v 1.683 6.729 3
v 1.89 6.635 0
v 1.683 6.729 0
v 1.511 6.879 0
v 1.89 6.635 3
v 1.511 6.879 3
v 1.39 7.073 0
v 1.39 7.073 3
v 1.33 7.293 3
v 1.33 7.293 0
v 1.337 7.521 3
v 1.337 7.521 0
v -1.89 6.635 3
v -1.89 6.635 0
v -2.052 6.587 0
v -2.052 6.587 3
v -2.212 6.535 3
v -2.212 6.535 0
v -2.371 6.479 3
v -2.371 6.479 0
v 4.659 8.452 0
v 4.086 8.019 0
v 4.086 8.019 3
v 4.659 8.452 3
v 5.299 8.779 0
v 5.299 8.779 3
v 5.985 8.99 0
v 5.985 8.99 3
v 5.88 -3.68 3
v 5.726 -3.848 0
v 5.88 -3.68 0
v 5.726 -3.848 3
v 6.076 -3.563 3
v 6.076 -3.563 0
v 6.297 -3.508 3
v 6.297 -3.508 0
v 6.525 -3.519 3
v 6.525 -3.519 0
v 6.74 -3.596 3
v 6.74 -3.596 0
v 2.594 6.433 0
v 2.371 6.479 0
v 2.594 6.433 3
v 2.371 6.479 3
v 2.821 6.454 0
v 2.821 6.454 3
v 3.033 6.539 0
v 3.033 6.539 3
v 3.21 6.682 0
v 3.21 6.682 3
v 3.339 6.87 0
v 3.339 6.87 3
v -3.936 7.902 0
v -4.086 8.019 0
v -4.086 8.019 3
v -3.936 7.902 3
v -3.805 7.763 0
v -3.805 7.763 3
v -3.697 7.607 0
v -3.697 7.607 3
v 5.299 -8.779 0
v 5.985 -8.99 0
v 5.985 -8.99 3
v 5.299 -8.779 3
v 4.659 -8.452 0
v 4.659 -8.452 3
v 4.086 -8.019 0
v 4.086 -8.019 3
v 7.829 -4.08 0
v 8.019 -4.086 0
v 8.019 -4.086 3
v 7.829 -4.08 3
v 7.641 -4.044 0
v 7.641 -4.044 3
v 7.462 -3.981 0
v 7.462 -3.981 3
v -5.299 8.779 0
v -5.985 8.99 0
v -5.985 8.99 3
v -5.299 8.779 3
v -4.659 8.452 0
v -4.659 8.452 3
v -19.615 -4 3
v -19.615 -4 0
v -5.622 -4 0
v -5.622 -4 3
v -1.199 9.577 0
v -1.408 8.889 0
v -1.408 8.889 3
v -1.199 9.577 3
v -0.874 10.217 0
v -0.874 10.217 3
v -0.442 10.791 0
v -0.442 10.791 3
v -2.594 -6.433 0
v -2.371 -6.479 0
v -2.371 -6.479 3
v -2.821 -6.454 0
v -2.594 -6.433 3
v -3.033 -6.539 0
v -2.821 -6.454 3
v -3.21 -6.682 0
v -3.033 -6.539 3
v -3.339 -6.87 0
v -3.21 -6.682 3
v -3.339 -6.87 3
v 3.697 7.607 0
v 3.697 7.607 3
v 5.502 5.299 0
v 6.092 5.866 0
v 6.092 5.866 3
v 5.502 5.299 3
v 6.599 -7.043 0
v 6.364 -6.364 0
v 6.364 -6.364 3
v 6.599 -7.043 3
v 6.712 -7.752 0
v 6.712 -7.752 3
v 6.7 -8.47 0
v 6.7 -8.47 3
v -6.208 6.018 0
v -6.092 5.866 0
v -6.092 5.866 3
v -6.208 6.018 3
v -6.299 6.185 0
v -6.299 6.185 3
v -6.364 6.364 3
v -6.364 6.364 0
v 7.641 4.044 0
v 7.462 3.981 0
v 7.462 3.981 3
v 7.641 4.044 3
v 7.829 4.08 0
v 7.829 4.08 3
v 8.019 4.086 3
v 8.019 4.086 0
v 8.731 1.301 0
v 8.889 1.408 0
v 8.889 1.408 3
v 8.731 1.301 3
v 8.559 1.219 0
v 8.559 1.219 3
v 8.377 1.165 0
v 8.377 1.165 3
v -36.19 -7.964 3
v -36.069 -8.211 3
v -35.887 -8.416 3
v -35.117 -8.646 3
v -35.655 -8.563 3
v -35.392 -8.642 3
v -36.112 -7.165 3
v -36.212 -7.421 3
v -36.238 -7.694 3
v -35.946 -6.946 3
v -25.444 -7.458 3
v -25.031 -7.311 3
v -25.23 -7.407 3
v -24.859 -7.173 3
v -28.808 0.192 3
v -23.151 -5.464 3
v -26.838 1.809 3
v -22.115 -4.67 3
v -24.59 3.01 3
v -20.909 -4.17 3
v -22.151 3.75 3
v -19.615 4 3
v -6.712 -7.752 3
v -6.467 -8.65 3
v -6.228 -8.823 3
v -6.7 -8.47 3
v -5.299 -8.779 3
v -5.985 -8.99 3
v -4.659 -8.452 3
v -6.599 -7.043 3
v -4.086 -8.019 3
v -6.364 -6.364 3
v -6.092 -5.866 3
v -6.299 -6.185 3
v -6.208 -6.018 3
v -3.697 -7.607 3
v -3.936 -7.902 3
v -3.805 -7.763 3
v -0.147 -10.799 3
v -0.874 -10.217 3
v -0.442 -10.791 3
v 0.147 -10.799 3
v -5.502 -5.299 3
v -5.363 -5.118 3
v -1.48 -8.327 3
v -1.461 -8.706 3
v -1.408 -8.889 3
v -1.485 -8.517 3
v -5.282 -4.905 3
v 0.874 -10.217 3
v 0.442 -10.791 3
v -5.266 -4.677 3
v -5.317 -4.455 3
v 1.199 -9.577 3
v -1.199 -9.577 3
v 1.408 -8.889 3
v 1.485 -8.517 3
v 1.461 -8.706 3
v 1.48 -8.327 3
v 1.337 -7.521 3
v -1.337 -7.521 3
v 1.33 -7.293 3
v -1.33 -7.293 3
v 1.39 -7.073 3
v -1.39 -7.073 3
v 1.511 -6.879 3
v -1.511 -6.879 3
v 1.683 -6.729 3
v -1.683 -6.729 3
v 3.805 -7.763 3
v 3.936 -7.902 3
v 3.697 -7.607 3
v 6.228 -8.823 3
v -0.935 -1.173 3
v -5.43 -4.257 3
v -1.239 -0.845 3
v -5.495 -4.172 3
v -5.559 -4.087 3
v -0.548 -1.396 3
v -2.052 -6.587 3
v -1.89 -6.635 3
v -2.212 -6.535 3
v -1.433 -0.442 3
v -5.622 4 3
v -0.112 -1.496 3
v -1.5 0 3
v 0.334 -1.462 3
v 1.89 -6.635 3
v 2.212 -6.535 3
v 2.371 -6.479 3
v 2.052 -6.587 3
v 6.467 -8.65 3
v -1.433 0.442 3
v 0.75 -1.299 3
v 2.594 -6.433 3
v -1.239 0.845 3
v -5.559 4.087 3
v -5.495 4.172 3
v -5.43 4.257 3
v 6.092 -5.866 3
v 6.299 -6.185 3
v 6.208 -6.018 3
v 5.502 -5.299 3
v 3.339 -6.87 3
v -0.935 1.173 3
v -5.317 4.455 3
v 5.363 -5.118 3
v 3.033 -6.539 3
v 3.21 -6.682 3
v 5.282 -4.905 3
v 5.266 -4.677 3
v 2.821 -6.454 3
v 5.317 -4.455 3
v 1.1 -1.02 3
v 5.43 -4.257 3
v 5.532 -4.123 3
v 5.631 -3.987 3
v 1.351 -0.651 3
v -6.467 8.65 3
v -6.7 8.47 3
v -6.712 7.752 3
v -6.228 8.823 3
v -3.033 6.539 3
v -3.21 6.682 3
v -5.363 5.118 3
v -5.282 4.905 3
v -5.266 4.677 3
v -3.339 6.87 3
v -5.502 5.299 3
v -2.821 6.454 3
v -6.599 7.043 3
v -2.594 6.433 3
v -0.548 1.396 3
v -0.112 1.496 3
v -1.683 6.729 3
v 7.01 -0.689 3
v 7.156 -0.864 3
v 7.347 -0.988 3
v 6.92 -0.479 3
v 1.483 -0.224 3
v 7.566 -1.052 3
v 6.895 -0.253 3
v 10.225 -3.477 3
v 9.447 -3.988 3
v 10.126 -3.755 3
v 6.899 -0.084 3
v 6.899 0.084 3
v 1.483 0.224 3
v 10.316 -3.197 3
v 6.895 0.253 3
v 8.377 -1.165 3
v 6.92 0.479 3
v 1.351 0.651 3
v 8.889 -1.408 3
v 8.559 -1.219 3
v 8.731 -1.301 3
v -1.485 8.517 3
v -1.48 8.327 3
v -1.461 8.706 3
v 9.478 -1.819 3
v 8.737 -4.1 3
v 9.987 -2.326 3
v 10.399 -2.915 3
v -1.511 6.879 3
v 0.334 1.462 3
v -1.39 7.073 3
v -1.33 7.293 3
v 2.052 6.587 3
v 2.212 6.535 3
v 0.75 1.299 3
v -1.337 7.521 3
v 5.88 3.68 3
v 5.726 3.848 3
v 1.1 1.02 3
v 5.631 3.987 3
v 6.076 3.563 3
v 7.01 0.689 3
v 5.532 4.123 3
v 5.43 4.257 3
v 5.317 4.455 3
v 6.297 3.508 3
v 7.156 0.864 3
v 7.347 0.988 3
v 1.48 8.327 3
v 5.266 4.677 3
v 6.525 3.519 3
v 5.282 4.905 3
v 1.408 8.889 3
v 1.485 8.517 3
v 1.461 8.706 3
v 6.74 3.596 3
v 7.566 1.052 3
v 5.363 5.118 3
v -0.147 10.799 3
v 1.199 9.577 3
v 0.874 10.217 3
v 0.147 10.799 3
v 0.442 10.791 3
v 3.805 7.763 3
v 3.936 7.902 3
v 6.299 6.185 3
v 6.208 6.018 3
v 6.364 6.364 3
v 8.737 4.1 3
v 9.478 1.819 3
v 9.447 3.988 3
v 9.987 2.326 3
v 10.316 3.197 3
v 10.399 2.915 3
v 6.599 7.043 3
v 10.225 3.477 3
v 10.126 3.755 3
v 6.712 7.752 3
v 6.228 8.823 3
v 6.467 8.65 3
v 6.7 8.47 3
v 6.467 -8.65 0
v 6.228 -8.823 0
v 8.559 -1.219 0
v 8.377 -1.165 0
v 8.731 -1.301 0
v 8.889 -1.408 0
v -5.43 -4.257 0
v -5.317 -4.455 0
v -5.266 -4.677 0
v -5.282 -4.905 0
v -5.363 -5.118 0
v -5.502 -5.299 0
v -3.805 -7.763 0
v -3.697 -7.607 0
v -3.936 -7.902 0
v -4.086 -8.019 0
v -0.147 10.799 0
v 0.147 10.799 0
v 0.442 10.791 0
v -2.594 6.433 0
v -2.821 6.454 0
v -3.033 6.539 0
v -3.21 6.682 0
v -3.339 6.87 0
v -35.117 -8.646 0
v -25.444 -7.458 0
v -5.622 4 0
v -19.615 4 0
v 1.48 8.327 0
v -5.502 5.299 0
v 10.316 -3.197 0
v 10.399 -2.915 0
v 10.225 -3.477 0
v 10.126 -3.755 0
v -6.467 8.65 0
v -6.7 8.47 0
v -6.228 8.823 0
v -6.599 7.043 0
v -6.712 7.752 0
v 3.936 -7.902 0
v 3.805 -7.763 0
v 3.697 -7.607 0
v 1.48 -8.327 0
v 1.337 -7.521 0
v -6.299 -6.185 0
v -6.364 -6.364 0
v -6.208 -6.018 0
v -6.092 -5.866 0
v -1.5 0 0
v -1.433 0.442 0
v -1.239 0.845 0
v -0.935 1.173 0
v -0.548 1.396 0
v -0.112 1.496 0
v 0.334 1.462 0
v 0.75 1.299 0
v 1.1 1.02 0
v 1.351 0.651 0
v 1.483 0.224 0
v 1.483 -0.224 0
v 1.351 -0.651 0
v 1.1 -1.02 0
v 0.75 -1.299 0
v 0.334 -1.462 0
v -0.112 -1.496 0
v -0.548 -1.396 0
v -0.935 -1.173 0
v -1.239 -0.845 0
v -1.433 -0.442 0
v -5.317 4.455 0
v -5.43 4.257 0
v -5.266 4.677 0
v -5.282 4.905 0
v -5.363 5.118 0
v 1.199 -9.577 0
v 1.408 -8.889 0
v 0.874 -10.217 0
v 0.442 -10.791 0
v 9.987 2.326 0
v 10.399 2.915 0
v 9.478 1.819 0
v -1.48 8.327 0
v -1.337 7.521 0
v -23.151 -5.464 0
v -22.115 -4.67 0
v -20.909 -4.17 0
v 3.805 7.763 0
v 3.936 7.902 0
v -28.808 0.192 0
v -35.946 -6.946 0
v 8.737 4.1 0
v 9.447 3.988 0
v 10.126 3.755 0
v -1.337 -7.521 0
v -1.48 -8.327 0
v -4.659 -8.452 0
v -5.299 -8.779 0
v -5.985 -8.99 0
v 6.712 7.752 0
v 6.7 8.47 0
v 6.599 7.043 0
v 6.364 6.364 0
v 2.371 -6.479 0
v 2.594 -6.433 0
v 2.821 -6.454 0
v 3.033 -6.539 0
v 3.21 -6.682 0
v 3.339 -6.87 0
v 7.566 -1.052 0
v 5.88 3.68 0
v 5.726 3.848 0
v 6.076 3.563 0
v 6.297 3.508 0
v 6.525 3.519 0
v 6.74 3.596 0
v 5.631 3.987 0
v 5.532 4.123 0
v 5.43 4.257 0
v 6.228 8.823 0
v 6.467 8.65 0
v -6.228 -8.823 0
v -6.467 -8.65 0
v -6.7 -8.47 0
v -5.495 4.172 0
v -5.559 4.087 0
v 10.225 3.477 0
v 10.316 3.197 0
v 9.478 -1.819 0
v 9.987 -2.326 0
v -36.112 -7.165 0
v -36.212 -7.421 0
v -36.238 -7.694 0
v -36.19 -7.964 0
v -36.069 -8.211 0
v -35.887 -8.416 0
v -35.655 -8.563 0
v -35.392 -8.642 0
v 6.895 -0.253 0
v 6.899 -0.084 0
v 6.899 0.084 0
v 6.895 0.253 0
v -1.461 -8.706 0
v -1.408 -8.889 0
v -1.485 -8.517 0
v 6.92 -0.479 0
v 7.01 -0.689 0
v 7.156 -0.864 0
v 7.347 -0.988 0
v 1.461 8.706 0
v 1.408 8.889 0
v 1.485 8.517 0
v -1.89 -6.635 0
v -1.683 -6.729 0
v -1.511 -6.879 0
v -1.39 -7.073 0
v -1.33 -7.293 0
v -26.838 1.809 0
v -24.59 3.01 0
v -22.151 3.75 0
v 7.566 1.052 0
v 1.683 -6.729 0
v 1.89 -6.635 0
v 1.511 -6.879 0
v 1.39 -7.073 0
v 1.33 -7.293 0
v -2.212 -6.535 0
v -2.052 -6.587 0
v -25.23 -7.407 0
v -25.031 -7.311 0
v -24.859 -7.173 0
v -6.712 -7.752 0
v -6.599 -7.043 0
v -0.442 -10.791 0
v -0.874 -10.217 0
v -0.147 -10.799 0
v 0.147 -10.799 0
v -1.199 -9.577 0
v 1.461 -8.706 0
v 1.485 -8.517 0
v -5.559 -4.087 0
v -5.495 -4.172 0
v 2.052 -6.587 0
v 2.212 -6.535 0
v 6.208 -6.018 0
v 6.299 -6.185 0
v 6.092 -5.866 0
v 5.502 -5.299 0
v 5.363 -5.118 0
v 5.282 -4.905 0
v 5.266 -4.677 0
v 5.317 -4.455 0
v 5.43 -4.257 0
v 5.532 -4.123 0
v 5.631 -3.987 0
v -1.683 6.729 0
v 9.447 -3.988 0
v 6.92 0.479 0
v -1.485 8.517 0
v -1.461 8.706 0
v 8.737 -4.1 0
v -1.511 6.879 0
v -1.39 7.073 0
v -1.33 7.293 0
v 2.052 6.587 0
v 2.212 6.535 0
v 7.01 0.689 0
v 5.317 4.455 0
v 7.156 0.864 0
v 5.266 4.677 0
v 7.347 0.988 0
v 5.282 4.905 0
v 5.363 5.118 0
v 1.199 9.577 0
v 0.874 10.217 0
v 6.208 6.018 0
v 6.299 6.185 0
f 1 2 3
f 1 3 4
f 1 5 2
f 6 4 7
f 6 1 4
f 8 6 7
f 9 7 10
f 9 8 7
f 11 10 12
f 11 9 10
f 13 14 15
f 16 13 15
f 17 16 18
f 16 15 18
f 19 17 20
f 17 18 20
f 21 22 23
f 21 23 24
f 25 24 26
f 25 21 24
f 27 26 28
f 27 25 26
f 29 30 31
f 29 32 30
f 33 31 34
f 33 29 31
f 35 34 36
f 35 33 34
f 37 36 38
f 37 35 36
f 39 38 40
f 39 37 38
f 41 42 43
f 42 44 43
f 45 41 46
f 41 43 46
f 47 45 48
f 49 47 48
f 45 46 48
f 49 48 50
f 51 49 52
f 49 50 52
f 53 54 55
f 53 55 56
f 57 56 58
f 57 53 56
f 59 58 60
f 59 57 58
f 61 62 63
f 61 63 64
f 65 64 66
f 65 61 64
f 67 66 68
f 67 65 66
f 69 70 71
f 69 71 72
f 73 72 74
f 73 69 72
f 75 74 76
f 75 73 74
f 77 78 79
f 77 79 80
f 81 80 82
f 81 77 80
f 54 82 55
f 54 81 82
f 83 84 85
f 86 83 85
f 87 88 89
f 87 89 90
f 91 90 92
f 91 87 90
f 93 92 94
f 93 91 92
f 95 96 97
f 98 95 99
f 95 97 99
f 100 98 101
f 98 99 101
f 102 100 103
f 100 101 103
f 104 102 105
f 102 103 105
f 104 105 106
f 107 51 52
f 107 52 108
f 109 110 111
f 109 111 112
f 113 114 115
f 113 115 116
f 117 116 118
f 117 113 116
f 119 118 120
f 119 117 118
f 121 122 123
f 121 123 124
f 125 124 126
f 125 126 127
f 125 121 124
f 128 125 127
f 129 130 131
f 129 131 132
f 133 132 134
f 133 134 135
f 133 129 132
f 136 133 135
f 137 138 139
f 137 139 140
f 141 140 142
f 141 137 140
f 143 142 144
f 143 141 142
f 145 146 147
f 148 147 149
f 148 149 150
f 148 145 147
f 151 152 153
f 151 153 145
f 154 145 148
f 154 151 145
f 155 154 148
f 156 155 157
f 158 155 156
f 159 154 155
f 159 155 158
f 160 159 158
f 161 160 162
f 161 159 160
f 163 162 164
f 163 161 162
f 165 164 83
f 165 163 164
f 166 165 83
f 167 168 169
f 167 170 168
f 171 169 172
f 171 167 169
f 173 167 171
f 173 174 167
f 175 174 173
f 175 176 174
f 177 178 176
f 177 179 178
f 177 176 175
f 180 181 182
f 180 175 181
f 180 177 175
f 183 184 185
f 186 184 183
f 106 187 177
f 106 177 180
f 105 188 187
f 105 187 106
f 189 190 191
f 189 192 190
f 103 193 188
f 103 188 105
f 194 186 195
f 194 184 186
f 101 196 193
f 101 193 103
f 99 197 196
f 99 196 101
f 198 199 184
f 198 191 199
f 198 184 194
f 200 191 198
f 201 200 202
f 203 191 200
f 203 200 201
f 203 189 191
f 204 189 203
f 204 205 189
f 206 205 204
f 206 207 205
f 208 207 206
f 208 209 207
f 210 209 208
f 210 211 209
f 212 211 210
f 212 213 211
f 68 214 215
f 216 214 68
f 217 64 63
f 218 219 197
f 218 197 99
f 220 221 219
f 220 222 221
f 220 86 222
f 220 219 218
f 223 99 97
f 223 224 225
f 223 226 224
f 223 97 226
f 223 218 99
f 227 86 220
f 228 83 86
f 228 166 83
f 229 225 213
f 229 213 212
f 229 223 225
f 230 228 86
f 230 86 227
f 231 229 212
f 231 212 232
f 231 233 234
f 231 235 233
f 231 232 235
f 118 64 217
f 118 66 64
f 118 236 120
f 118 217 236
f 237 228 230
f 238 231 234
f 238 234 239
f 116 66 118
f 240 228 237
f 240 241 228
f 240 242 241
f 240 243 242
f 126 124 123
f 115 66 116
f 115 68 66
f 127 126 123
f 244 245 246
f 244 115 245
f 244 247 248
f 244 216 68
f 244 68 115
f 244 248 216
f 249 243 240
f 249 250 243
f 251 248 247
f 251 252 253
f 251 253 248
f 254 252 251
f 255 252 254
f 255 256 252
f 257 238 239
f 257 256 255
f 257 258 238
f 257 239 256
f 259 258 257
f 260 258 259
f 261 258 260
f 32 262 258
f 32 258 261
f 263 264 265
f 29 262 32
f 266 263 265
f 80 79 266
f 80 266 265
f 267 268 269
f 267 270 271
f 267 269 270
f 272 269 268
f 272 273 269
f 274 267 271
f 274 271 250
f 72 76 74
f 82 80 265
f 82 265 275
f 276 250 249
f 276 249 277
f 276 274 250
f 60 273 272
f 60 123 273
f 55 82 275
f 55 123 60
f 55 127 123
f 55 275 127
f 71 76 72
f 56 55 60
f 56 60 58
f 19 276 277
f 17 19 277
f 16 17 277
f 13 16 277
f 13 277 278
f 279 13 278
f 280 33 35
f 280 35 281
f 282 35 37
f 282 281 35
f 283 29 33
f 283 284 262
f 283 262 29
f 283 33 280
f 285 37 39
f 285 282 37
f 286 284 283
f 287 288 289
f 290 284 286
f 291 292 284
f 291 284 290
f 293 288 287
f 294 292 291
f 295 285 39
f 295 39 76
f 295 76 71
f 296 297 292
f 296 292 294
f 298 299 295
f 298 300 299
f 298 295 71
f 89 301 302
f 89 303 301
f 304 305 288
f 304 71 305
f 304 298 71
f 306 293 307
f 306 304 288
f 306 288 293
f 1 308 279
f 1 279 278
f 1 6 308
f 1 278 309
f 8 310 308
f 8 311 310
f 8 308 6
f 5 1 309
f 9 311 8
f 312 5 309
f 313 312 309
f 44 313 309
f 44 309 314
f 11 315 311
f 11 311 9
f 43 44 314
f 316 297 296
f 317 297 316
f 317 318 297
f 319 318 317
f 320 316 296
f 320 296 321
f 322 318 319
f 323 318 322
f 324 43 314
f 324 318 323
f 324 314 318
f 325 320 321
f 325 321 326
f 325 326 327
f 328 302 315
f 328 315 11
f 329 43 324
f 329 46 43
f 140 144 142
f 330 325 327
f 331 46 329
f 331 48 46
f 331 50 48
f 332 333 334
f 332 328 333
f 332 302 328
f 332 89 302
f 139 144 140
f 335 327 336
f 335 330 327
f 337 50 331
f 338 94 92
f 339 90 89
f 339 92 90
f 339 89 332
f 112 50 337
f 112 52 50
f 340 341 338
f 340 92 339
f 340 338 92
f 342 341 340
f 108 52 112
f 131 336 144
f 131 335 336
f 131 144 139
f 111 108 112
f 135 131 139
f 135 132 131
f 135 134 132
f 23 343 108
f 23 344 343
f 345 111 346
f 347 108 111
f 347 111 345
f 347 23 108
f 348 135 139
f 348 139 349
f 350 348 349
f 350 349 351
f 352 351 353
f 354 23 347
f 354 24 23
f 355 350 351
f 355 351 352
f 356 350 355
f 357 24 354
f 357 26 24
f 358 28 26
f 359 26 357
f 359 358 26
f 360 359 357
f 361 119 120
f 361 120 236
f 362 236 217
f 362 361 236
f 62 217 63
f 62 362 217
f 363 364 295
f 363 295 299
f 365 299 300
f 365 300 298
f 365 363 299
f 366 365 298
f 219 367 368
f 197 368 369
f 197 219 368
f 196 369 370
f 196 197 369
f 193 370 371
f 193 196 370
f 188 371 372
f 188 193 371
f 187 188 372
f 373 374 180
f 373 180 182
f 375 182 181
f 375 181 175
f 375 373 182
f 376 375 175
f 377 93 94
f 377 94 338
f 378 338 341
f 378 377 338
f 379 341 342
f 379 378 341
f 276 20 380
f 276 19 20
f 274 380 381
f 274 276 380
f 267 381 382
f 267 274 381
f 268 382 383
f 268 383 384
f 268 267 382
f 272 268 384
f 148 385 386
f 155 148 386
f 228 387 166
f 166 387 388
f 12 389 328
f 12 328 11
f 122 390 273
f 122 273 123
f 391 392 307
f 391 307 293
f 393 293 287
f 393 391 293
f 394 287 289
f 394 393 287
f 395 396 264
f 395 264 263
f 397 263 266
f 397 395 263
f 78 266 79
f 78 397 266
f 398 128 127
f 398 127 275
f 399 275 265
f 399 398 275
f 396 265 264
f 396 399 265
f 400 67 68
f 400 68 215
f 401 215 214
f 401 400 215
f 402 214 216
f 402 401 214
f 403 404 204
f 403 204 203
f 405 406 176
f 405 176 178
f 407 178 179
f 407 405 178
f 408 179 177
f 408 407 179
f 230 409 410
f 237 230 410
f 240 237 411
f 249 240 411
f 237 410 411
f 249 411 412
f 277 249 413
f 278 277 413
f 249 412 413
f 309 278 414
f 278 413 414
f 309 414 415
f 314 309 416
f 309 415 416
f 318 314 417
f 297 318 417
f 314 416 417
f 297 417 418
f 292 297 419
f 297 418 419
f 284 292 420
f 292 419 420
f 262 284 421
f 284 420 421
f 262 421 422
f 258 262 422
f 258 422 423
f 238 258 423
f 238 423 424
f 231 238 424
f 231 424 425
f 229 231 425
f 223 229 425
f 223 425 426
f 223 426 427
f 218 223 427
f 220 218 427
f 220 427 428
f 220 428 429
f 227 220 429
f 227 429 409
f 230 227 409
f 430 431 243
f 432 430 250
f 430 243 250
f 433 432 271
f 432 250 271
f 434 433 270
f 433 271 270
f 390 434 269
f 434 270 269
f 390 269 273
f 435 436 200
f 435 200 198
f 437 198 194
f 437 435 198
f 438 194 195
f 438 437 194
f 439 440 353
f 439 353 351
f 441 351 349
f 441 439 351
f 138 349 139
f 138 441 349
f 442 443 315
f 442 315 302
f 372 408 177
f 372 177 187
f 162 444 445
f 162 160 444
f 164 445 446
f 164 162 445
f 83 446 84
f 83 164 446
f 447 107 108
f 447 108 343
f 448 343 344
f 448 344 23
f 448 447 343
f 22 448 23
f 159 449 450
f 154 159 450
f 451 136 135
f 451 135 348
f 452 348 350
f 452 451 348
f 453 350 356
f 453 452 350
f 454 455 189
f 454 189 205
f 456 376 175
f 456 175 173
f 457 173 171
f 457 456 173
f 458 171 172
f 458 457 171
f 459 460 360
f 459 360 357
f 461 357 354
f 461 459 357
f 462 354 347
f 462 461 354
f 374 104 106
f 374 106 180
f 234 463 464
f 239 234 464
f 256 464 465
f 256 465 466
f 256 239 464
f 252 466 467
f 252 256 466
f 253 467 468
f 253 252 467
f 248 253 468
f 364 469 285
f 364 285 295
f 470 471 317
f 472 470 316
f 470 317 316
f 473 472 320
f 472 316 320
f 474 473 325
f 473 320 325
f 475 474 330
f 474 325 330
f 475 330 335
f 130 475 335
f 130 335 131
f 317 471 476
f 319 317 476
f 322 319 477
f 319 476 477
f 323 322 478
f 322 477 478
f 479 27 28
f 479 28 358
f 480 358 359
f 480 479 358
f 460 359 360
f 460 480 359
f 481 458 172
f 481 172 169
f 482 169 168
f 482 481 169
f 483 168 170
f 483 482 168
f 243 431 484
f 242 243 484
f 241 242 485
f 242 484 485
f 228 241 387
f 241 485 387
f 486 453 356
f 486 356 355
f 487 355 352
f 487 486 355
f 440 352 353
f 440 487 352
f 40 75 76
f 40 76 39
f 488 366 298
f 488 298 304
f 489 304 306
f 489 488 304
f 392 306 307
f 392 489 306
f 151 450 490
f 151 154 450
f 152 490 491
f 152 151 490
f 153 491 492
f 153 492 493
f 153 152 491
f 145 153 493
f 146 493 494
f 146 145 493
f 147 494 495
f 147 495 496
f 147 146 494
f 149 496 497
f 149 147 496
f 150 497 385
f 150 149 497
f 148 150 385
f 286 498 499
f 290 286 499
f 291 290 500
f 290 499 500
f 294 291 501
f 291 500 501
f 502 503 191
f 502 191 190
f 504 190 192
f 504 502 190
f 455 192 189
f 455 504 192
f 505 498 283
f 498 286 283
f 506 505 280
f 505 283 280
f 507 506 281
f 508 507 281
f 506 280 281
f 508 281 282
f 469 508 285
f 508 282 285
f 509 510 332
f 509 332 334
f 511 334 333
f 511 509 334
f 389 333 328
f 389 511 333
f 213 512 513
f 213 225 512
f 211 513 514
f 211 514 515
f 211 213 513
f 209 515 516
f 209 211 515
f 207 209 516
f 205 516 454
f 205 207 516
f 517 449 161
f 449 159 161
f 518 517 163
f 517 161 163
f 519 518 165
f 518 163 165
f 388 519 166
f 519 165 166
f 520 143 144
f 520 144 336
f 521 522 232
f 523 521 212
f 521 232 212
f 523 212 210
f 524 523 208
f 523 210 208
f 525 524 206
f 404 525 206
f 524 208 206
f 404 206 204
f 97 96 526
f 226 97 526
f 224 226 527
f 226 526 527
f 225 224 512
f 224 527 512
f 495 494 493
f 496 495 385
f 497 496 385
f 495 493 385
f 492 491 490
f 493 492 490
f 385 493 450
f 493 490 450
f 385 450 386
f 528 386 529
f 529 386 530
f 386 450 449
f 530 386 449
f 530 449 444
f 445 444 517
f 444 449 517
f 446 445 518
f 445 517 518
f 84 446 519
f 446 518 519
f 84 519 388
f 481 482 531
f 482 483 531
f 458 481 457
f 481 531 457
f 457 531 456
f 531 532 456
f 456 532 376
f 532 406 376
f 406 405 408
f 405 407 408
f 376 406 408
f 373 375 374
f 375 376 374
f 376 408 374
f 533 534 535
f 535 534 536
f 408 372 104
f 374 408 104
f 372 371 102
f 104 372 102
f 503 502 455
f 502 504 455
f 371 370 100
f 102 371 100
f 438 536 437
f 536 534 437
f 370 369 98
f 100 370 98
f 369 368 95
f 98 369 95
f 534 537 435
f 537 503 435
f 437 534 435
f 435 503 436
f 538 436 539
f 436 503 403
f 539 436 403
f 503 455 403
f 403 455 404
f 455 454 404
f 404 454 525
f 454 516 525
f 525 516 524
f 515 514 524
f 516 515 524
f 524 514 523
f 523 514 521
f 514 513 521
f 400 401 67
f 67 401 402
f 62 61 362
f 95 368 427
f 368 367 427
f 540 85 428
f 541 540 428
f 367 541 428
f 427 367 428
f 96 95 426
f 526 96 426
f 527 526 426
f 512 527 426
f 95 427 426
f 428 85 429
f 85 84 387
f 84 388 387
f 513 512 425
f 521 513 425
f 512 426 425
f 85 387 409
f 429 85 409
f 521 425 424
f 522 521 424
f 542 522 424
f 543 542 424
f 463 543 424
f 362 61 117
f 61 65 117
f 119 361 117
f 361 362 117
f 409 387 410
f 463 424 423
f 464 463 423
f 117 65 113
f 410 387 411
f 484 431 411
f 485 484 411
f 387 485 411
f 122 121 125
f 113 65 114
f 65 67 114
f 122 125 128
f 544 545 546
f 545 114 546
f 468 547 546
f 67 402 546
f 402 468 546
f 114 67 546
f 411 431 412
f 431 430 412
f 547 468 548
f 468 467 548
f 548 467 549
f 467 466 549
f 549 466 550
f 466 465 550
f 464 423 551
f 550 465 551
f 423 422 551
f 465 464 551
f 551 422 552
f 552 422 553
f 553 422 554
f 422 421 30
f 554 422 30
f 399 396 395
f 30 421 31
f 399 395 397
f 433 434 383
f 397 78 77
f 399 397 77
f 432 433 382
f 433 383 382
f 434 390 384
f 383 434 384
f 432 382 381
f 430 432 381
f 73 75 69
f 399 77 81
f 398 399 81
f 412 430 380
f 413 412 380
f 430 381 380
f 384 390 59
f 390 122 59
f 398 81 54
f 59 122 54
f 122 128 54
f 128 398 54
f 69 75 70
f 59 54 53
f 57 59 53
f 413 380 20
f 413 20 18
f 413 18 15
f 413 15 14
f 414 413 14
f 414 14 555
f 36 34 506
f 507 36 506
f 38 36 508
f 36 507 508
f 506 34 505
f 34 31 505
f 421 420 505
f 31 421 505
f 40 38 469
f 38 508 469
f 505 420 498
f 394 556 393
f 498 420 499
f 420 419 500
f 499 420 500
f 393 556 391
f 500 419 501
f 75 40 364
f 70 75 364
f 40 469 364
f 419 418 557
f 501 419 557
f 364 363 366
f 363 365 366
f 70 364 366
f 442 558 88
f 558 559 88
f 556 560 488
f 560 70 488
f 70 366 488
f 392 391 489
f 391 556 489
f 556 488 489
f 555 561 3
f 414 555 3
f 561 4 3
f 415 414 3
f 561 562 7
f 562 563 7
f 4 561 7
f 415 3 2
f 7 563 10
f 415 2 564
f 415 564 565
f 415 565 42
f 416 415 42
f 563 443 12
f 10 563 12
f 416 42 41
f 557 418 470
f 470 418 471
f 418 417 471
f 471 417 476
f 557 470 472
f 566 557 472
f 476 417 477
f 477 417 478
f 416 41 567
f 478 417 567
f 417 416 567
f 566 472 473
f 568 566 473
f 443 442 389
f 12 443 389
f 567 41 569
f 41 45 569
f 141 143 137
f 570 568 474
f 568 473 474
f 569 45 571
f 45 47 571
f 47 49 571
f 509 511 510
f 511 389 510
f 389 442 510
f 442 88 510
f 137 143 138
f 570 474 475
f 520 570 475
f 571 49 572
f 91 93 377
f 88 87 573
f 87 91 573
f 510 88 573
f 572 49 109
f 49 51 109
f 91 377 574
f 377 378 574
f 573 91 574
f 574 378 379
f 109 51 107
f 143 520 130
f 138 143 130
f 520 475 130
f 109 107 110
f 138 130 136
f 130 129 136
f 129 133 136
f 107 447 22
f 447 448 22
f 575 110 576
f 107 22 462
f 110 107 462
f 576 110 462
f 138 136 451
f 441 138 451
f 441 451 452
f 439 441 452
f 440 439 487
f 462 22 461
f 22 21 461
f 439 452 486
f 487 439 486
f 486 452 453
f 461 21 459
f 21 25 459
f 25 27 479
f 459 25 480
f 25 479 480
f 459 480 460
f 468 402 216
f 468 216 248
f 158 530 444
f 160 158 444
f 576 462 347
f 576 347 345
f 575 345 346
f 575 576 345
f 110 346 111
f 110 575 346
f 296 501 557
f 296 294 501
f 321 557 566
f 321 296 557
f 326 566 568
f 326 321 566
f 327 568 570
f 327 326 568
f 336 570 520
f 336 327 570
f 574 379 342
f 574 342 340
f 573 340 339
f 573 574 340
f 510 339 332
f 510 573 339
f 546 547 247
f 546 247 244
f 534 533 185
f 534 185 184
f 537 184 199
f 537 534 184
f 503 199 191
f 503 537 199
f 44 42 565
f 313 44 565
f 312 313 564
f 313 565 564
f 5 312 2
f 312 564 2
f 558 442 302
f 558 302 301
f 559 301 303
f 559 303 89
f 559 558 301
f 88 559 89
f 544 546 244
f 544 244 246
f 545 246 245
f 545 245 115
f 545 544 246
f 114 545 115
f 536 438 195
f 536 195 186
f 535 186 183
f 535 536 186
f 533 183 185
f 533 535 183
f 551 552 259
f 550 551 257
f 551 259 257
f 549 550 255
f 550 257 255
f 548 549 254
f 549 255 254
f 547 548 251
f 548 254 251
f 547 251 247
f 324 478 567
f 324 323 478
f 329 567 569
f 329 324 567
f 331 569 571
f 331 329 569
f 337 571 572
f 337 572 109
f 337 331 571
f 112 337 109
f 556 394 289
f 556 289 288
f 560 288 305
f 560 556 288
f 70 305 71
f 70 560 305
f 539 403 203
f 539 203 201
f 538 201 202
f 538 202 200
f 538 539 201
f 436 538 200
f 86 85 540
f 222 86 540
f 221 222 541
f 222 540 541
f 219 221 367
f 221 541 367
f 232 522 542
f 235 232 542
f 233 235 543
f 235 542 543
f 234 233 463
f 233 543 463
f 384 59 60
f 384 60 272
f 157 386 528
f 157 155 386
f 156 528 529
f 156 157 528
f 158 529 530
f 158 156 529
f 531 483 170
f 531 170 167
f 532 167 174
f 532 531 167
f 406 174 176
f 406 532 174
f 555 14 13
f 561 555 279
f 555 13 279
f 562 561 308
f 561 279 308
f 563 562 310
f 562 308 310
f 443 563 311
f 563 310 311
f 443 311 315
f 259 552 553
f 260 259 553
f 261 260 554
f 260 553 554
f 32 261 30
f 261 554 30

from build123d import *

# Parameters (mm, degrees)
POSICIONAMENTOS_R               = 6.8994
BASE_DEPTH                      = 3
BASE_DENTE_DEPTH                = 3
RAIO_DENTE_R                    = 0.778916794
PADR_OCIRCULAR1_COUNT           = 10
RAIO_DENTE_OF_PADR_OCIRCULAR1_R = 0.778916794
RESSALTO_EXTRUS_O3_DEPTH        = 3
FURO_DE_DI_METRO_3_0_3_1_D      = 3
FILETE2_R                       = 5
FILETE3_R                       = 13
FILETE4_R                       = 1


with BuildPart() as part:
    # Posicionamentos → Base (new body)
    with BuildSketch(Plane.XY):
        Circle(POSICIONAMENTOS_R)
    extrude(amount=BASE_DEPTH)

    # Dente → Base Dente (add, through all)
    with BuildSketch(Plane.XY):
        with BuildLine():
            Line((1.480256779, 8.326682401), (1.207591527, 6.792896515))
            ThreePointArc((1.207591527, 6.792896515), (0, 6.8994), (-1.207591527, 6.792896515))
            Line((-1.207591527, 6.792896515), (-1.480256779, 8.326682401))
            ThreePointArc((-1.480256779, 8.326682401), (-1.476621376, 8.612123538), (-1.407910185, 8.889195065))
            ThreePointArc((-1.407910185, 8.889195065), (-1.05050148, 9.903958065), (-0.441648539, 10.79096597))
            ThreePointArc((-0.441648539, 10.79096597), (0, 10.8), (0.441648539, 10.79096597))
            ThreePointArc((0.441648539, 10.79096597), (1.05050148, 9.903958065), (1.407910185, 8.889195065))
            ThreePointArc((1.407910185, 8.889195065), (1.476621376, 8.612123538), (1.480256779, 8.326682401))
        make_face()
    base_dente = extrude(amount=BASE_DENTE_DEPTH)

    # Raio Dente
    raio_dente_edges = [part.edges().sort_by_distance(p)[0] for p in [
        (-1.207591527, 6.792896515, 1.5),
        (1.207591527, 6.792896515, 1.5),
    ]]
    fillet(raio_dente_edges, radius=RAIO_DENTE_R)

    # PadrãoCircular1: Base Dente ×10 about axis, 2 skipped
    padr_ocircular1_axis = Axis((0, 0, 0), (0, 0, -1))
    add([base_dente.rotate(padr_ocircular1_axis, i * 360 / PADR_OCIRCULAR1_COUNT) for i in range(1, PADR_OCIRCULAR1_COUNT) if i not in (7, 8)])

    # Raio Dente of PadrãoCircular1
    raio_dente_of_padr_ocircular1_edges = [part.edges().sort_by_distance(p)[0] for p in [
        (3.015802325, 6.205373212, 1.5),
        (4.969726459, 4.785764232, 1.5),
        (6.087262191, 3.247608255, 1.5),
        (6.833594799, 0.950632674, 1.5),
        (6.833594799, -0.950632674, 1.5),
        (6.087262191, -3.247608255, 1.5),
        (4.969726459, -4.785764232, 1.5),
        (3.015802325, -6.205373212, 1.5),
        (1.207591527, -6.792896515, 1.5),
        (-1.207591527, -6.792896515, 1.5),
        (-3.015802325, -6.205373212, 1.5),
        (-4.969726459, -4.785764232, 1.5),
        (-4.969726459, 4.785764232, 1.5),
        (-3.015802325, 6.205373212, 1.5),
    ]]
    fillet(raio_dente_of_padr_ocircular1_edges, radius=RAIO_DENTE_OF_PADR_OCIRCULAR1_R)

    # Braço → Ressalto-extrusão3 (add, through all)
    with BuildSketch(Plane.XY):
        Polygon((0, 4), (-25, 4), (-38, -9), (-25.102702489, -7.416410988), (-21.686291501, -4), (0, -4), align=None)
    extrude(amount=RESSALTO_EXTRUS_O3_DEPTH)

    # Furo de diâmetro Ø3.0 (3)1 (through all)
    with Locations(Plane.XY.offset(3)):
        with Locations((0, 0)):
            Hole(FURO_DE_DI_METRO_3_0_3_1_D / 2)

    # Filete2
    filete2_edges = [part.edges().sort_by_distance(p)[0] for p in [
        (-21.686291501, -4, 1.5),
    ]]
    fillet(filete2_edges, radius=FILETE2_R)

    # Filete3
    filete3_edges = [part.edges().sort_by_distance(p)[0] for p in [
        (-25, 4, 1.5),
    ]]
    fillet(filete3_edges, radius=FILETE3_R)

    # Filete4
    filete4_edges = [part.edges().sort_by_distance(p)[0] for p in [
        (-25.102702489, -7.416410988, 1.5),
        (-38, -9, 1.5),
    ]]
    fillet(filete4_edges, radius=FILETE4_R)


solid = part.part
